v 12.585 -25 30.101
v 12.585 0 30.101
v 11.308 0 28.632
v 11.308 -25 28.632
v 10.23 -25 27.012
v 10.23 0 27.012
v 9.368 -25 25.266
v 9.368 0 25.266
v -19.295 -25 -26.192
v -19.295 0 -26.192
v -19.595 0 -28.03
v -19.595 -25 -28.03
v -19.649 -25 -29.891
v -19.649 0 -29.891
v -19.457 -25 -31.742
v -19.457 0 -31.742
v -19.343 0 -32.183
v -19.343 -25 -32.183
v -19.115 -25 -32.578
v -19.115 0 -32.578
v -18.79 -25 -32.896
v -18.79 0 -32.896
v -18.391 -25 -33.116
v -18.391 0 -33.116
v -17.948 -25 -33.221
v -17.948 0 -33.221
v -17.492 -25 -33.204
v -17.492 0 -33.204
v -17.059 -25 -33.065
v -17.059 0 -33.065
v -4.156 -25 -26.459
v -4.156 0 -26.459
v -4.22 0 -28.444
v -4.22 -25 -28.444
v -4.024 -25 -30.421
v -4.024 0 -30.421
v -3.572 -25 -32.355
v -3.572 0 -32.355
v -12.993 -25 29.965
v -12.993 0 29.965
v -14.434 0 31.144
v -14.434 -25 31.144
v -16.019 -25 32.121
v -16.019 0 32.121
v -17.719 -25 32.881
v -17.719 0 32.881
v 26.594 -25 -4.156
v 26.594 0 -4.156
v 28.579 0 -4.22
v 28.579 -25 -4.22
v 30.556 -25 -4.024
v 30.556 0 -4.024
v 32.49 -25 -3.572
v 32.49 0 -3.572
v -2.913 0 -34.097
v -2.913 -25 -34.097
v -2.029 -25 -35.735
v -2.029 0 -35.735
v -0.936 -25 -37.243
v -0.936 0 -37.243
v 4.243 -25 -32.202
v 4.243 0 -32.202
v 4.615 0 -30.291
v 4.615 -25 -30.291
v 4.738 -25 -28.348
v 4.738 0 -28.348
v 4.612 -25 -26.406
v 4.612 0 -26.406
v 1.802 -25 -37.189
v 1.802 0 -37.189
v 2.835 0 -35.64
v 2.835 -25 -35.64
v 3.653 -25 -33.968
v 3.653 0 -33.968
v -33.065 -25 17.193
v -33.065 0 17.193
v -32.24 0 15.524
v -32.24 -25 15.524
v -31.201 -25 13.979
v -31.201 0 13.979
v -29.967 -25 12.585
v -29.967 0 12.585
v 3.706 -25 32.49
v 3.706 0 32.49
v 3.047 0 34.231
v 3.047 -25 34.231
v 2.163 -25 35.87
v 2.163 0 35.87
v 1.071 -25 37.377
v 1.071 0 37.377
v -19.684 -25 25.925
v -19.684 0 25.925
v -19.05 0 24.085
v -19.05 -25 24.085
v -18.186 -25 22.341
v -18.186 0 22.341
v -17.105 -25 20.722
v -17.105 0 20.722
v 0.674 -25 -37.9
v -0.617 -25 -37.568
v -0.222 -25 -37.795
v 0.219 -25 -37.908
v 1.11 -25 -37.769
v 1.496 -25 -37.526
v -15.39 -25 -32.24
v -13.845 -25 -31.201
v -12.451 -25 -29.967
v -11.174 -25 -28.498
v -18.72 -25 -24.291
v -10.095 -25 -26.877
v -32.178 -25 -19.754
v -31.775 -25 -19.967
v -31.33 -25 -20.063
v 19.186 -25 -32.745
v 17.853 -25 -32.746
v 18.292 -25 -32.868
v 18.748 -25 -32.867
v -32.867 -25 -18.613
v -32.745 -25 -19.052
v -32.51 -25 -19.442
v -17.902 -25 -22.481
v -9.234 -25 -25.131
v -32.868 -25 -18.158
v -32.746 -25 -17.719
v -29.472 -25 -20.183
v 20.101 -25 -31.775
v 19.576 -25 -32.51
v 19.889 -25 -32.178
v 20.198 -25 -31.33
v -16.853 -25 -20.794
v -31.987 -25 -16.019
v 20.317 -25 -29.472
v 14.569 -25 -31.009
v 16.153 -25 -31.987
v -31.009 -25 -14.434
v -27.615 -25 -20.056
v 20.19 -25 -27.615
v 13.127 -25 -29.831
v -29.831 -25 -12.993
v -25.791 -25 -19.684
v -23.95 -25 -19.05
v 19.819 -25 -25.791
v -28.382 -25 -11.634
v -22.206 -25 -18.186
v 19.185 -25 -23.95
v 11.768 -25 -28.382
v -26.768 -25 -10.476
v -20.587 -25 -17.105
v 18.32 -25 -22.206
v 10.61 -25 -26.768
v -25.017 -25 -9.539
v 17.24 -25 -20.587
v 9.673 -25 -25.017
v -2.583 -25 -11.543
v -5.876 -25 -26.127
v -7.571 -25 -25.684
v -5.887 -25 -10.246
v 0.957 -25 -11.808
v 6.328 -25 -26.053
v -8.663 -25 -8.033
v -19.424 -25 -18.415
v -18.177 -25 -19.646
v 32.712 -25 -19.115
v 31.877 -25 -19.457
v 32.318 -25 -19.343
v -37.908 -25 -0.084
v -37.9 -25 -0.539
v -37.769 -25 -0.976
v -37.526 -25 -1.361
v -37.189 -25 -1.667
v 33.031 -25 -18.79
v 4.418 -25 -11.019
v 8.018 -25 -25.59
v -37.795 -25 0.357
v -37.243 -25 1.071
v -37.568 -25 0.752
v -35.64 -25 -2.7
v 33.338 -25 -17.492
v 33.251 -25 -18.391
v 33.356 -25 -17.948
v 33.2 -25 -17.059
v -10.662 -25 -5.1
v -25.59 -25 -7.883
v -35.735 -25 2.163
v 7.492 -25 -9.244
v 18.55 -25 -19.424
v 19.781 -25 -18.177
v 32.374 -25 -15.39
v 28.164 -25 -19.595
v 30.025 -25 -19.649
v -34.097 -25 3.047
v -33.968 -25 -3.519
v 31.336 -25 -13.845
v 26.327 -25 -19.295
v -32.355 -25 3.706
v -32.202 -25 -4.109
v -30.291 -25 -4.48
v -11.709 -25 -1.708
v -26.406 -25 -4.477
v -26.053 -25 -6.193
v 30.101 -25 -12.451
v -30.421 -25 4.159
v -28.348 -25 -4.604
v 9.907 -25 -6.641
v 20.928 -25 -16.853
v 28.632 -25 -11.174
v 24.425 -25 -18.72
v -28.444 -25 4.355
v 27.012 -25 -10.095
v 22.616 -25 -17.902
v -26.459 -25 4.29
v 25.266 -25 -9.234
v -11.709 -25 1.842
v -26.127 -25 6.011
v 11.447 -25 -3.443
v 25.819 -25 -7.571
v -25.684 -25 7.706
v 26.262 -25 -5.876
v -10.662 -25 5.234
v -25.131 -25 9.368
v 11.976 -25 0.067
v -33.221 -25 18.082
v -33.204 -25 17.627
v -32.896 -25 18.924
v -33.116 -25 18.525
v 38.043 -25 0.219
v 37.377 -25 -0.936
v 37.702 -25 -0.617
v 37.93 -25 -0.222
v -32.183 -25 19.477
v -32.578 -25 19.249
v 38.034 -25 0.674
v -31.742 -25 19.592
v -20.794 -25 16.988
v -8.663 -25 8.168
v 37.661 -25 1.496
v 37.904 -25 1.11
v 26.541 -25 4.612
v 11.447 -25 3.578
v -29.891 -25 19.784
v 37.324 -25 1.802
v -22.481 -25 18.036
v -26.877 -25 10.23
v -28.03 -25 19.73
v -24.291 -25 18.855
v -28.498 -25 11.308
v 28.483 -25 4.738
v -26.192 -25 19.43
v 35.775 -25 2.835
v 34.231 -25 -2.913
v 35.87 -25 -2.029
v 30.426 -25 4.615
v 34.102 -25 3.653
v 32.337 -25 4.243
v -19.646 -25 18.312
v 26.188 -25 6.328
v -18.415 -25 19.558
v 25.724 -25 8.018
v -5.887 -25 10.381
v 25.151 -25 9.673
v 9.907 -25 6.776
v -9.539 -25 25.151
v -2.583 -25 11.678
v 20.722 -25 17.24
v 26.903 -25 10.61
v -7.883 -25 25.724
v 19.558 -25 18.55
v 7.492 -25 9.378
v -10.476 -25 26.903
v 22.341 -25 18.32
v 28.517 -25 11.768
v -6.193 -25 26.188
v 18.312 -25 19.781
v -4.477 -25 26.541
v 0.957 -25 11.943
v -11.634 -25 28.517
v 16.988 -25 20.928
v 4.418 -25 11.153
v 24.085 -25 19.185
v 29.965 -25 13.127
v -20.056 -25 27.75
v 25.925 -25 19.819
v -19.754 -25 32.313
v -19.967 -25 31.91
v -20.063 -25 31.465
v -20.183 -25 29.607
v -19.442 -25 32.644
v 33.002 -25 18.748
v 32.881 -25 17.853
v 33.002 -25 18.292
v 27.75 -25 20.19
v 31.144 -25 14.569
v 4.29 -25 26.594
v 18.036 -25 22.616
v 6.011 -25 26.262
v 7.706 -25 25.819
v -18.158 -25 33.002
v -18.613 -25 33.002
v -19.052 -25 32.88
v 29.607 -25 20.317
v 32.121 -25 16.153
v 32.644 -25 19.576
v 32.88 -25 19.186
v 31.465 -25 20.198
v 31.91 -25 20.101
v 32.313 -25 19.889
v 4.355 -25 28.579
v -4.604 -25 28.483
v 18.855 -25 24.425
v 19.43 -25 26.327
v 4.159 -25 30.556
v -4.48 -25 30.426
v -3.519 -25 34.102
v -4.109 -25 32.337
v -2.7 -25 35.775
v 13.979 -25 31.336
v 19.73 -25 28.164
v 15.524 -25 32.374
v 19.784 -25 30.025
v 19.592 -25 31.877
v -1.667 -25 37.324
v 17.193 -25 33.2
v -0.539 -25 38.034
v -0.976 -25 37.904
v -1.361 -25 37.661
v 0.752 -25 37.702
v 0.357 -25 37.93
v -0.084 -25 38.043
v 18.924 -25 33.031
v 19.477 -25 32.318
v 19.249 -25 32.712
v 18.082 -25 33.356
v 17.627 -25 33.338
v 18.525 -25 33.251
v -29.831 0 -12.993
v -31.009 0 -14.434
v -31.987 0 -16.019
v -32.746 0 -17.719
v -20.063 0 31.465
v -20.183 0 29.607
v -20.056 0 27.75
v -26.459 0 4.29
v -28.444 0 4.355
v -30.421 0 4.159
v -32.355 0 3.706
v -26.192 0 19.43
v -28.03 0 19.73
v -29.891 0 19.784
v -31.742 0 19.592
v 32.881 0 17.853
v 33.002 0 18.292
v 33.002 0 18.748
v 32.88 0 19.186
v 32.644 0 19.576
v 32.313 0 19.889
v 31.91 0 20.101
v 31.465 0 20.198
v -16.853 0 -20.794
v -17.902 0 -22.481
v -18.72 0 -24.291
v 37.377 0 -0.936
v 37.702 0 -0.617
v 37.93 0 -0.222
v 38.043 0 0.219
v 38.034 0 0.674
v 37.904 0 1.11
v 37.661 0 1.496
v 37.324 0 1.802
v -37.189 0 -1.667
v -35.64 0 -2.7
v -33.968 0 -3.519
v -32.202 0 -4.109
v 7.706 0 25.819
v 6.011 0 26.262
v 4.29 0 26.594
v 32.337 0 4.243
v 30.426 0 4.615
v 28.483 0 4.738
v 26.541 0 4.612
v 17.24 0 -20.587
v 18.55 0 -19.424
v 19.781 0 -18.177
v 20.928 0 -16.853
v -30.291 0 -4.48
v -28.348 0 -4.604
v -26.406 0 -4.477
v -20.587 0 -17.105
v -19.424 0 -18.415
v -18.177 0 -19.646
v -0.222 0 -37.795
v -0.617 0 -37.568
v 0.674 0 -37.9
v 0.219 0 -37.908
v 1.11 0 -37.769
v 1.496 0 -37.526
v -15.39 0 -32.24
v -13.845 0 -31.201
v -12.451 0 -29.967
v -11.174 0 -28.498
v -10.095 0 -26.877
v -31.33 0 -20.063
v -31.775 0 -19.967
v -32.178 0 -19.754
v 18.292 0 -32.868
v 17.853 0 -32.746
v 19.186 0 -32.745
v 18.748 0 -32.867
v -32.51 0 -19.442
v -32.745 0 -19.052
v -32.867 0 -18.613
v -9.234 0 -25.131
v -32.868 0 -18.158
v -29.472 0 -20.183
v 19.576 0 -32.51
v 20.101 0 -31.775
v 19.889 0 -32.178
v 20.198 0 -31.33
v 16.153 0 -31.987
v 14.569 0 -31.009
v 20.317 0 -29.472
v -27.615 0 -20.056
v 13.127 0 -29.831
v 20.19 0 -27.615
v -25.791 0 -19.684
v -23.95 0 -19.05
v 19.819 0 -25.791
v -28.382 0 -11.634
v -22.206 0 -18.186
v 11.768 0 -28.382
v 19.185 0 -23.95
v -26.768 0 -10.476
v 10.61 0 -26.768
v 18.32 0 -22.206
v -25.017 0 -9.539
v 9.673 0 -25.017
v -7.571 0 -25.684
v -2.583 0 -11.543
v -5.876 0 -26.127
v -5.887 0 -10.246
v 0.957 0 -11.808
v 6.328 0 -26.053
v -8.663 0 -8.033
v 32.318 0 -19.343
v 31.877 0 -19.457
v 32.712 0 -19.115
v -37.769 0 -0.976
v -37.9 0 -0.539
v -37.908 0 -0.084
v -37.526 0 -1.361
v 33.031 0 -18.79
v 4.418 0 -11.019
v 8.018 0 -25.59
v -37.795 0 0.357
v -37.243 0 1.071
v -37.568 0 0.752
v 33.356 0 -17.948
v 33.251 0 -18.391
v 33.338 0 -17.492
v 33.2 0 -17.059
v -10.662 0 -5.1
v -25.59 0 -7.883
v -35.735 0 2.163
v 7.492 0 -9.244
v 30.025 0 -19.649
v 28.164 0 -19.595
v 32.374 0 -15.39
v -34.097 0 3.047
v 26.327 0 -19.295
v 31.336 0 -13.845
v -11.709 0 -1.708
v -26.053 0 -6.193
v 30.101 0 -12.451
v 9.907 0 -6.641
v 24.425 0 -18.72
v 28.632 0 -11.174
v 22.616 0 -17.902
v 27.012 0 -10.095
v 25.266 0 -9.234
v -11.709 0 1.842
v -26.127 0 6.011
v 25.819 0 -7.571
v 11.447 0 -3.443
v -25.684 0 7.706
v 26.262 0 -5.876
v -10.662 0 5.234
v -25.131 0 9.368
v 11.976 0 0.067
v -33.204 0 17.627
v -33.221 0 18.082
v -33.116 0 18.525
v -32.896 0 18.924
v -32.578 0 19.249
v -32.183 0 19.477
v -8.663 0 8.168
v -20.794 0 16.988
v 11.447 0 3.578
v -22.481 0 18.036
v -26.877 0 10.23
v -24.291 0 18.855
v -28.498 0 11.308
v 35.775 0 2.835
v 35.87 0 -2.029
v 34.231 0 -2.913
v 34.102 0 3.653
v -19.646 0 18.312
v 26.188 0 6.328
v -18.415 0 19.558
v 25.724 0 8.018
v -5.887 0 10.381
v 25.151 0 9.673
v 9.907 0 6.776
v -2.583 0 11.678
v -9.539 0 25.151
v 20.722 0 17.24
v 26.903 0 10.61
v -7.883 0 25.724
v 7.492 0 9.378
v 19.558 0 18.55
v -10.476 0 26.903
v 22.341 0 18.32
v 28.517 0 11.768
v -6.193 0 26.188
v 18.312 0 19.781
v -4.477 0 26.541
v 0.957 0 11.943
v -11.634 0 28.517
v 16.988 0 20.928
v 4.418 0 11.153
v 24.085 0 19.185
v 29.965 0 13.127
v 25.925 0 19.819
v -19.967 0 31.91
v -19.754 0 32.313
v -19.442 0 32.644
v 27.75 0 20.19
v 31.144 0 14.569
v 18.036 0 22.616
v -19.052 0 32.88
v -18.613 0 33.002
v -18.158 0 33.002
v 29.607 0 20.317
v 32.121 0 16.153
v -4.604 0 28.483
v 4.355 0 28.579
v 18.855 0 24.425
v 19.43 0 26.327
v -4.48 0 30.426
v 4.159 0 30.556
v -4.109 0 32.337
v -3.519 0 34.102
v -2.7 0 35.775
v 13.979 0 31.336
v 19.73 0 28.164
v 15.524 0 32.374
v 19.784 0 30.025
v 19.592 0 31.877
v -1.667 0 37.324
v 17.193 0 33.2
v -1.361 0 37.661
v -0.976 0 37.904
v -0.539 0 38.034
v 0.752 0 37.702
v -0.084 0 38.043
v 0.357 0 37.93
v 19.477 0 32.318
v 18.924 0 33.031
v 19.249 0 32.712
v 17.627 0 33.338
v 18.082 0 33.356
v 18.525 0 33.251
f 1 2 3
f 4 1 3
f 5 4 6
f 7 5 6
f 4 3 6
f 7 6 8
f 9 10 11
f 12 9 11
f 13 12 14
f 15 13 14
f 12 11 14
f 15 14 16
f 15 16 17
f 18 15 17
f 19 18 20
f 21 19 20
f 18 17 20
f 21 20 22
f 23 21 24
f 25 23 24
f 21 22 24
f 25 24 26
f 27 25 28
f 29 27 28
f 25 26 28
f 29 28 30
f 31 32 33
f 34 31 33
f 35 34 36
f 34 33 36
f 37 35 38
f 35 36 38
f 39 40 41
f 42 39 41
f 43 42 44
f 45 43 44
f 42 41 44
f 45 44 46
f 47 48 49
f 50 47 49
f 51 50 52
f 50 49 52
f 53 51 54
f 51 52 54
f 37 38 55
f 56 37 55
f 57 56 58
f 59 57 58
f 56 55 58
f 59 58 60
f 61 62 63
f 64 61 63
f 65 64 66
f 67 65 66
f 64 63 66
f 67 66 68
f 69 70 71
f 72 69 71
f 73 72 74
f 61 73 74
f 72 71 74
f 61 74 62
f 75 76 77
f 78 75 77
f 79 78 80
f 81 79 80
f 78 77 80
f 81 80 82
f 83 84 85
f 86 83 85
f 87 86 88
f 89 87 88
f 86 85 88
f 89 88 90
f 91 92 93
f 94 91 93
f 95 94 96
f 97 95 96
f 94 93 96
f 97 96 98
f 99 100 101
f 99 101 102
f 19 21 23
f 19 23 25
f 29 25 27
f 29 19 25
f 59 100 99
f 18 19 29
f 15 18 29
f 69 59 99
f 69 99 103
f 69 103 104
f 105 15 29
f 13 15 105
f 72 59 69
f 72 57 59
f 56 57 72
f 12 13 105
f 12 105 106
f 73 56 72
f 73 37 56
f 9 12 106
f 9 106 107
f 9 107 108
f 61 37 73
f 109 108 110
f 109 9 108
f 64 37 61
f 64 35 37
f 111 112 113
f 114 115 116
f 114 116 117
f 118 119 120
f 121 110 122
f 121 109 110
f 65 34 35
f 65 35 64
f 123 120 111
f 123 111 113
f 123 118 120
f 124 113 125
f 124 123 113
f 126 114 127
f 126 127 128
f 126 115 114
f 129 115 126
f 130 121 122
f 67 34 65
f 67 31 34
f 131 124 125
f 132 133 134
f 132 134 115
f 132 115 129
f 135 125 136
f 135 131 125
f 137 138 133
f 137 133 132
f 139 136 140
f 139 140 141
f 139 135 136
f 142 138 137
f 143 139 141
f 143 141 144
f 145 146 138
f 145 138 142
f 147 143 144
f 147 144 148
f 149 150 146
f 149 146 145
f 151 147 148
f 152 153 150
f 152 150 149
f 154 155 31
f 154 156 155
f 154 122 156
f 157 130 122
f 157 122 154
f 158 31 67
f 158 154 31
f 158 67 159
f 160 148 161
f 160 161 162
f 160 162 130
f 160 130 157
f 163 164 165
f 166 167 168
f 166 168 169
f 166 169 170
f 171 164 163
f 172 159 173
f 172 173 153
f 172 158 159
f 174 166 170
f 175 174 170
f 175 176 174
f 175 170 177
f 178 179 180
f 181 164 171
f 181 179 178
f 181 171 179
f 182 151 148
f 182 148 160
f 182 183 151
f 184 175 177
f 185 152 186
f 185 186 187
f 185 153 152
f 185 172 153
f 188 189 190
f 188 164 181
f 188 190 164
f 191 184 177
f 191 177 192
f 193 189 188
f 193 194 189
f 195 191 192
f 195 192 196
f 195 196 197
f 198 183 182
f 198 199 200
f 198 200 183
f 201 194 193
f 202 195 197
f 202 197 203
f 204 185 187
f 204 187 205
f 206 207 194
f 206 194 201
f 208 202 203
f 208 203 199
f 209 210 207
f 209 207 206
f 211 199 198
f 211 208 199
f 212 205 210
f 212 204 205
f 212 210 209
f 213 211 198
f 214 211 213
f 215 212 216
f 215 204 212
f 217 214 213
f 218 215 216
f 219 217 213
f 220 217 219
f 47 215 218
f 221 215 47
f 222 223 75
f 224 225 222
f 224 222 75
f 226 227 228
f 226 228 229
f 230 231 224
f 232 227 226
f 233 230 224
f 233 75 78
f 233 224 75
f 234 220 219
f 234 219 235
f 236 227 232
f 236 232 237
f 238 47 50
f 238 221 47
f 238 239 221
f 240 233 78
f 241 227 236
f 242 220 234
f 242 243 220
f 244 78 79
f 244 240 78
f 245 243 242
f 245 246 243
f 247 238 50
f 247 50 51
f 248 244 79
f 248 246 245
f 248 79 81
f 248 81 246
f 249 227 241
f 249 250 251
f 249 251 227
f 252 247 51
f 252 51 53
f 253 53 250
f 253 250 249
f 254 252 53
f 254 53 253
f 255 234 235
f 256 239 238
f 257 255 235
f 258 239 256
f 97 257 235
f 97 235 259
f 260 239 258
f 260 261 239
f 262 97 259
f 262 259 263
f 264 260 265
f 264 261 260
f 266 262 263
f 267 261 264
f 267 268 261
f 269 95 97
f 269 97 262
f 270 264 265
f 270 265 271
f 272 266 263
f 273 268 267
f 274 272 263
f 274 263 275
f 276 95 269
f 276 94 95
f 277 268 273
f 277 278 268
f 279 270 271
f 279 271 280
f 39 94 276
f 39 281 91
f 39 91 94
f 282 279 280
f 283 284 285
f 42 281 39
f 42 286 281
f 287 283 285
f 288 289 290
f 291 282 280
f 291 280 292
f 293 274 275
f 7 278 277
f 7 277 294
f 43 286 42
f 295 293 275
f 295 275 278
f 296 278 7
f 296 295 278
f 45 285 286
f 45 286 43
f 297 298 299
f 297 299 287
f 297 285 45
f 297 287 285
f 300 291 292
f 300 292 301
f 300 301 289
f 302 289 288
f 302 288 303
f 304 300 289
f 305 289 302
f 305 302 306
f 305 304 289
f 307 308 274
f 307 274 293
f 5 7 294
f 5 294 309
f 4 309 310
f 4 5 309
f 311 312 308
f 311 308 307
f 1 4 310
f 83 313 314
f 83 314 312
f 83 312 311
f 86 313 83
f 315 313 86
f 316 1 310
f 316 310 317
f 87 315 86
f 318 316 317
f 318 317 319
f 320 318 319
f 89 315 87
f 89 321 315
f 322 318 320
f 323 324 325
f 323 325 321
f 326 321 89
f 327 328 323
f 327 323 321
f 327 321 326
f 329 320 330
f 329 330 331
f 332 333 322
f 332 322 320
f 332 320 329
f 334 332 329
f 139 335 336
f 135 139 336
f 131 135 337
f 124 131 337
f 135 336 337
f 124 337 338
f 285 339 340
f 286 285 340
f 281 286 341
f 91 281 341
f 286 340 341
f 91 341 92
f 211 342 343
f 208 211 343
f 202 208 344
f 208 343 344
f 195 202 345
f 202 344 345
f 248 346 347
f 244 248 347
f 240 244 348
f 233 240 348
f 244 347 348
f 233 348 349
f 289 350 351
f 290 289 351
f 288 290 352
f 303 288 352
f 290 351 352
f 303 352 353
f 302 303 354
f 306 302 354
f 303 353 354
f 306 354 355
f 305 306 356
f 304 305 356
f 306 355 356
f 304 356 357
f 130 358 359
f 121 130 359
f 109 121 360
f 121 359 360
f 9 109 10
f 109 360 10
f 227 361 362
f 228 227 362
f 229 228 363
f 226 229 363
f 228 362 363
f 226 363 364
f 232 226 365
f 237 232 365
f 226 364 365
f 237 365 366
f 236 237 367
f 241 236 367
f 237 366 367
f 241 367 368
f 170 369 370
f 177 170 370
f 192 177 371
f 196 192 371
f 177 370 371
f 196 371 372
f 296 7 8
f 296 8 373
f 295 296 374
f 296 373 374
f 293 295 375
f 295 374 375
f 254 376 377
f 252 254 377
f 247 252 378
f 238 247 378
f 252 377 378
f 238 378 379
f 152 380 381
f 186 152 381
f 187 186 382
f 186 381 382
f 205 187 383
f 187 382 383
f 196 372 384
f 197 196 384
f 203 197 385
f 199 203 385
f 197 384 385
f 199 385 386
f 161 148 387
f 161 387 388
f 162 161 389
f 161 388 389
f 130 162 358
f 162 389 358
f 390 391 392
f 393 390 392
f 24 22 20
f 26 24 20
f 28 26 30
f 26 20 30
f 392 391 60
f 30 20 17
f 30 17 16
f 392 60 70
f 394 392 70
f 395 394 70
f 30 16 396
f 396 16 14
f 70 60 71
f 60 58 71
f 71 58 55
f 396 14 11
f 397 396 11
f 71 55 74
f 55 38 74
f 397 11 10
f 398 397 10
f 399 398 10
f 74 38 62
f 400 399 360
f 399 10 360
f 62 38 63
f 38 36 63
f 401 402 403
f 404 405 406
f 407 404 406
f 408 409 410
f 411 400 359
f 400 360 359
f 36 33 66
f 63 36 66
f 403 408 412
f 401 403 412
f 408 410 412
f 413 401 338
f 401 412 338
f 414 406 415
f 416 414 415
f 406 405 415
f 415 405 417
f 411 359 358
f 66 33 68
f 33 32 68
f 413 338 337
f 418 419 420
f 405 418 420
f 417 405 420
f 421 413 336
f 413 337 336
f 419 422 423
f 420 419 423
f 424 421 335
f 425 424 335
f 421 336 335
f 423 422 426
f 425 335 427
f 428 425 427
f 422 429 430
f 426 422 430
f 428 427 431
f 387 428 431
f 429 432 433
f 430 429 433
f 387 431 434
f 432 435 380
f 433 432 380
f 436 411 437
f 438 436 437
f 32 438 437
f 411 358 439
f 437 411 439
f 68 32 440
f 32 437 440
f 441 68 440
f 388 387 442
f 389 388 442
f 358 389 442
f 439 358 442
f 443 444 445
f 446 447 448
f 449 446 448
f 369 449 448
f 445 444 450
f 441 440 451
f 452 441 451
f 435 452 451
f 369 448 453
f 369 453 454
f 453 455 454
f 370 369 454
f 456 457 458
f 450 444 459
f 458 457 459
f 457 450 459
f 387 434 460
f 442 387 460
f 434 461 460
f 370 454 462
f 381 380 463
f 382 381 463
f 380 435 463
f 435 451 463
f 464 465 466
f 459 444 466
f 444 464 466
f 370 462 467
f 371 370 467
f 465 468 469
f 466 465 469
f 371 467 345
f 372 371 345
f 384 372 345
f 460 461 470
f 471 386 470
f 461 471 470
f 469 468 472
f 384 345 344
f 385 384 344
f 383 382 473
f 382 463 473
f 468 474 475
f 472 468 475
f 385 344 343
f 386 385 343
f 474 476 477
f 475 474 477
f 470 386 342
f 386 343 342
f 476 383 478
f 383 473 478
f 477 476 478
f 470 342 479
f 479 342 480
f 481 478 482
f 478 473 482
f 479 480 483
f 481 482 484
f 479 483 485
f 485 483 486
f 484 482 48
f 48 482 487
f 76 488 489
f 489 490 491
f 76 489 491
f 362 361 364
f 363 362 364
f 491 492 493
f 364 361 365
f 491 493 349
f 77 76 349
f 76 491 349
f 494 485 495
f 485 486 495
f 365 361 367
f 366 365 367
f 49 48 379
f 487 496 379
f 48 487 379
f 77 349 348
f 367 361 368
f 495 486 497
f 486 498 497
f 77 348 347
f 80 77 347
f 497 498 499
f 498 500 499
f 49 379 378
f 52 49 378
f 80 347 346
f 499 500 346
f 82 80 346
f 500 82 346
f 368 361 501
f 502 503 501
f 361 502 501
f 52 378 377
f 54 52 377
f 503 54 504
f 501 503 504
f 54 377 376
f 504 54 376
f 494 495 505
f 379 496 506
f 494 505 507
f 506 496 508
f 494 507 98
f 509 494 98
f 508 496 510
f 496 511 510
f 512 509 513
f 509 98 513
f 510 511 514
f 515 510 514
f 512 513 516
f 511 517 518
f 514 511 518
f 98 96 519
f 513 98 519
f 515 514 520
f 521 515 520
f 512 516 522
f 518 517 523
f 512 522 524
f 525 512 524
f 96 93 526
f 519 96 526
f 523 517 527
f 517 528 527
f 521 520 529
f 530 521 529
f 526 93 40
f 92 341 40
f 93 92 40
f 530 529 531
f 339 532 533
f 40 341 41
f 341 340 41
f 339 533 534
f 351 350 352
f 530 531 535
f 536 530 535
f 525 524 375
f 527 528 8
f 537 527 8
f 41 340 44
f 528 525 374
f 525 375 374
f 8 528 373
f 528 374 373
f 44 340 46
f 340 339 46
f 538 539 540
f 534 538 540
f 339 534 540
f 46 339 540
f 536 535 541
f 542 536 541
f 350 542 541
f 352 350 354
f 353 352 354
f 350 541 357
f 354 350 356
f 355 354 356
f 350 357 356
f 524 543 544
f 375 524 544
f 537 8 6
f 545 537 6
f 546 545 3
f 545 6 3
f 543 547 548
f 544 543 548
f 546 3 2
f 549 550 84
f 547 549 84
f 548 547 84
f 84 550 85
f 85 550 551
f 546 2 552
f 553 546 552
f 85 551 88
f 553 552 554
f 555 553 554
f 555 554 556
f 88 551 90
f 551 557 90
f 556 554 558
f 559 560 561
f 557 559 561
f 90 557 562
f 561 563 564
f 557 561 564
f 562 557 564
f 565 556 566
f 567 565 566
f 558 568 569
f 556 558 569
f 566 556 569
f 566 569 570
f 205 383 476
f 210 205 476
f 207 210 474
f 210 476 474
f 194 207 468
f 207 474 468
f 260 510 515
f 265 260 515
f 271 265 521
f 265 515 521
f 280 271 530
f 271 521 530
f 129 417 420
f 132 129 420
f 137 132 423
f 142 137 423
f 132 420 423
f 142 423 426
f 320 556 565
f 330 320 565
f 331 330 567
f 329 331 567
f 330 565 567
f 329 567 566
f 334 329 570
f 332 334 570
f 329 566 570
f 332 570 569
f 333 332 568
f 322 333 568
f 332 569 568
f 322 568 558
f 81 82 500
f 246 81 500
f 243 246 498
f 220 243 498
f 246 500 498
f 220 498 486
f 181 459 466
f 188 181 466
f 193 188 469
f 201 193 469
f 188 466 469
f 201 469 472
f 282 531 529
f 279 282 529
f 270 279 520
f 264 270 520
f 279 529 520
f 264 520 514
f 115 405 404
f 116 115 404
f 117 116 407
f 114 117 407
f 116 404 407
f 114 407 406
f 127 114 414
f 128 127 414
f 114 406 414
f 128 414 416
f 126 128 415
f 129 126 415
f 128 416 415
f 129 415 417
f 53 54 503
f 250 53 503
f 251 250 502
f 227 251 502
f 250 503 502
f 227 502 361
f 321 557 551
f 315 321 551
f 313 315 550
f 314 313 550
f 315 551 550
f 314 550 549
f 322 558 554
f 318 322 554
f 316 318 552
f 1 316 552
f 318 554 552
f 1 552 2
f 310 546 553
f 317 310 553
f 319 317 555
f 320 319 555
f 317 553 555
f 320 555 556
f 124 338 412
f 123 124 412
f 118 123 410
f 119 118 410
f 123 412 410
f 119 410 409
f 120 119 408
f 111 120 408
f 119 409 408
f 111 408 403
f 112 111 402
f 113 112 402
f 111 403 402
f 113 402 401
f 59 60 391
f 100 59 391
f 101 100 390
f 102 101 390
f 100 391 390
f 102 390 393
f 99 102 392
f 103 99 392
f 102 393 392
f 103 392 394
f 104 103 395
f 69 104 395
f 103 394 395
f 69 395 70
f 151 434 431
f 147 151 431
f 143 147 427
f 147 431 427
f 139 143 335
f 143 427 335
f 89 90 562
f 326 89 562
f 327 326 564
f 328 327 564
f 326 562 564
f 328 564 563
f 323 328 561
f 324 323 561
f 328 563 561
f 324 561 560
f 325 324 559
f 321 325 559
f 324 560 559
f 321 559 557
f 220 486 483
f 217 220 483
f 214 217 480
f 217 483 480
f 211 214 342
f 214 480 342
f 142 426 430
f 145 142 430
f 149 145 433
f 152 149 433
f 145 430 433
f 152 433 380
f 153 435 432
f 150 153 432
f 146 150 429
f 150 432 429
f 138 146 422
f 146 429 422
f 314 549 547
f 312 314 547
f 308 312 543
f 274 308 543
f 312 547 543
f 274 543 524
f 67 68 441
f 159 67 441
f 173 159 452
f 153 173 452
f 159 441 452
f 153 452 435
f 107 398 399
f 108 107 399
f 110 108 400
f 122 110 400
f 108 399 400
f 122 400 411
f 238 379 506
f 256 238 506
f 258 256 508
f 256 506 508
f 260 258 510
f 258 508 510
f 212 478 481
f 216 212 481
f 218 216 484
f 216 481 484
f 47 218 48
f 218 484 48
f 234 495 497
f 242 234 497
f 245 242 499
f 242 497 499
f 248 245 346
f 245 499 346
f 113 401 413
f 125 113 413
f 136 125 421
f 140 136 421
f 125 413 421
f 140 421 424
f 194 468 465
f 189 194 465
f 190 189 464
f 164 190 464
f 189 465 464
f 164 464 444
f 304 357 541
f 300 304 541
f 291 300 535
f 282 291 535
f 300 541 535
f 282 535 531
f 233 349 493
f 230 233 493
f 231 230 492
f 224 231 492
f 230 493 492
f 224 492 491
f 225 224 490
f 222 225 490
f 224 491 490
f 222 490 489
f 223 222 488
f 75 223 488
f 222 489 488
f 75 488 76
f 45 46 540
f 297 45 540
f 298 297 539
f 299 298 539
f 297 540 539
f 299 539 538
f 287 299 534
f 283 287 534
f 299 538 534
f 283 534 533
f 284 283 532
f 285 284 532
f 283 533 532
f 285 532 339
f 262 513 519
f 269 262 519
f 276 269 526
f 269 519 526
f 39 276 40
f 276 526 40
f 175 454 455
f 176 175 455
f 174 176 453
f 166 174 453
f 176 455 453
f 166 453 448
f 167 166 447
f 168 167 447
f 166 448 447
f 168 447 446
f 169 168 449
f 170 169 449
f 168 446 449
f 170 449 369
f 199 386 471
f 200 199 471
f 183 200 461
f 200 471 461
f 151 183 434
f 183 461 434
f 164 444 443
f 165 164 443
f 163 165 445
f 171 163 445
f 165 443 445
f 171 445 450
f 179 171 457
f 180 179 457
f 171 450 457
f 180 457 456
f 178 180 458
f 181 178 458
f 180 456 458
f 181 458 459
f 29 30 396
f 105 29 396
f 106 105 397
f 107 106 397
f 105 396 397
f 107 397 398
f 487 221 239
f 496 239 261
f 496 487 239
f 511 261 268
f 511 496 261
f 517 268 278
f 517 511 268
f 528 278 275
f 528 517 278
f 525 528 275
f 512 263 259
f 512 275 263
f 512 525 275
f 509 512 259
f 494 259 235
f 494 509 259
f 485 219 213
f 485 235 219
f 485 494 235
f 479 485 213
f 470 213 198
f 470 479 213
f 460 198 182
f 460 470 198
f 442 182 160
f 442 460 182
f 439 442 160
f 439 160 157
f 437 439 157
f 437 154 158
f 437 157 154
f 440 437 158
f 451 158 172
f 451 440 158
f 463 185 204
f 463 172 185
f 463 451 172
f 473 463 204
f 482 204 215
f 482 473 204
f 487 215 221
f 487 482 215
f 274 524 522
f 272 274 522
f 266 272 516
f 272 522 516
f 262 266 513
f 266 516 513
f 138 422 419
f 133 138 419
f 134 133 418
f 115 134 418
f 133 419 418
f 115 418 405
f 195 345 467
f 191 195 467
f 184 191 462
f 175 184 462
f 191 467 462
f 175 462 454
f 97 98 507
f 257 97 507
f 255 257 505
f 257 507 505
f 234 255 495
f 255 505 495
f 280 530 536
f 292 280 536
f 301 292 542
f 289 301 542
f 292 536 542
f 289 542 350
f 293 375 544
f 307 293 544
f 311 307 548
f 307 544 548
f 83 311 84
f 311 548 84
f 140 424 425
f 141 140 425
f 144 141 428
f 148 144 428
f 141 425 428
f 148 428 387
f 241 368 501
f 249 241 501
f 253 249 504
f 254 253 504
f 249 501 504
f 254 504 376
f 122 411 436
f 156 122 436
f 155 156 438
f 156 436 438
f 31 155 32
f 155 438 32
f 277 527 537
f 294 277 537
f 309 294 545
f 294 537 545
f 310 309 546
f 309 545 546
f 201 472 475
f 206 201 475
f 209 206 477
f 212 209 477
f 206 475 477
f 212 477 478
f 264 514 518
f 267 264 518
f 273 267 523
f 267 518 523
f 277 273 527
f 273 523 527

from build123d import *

# Parameters (mm, degrees)
F0_R     = 11.90906
F1_DEPTH = 25
F2_COUNT = 12


with BuildPart() as f1:
    # F0 (on Front) → F1 (new body)
    with BuildSketch(Plane.XZ):
        with BuildLine():
            ThreePointArc((-4.4772, 26.540564), (-0.095682, 26.927299), (4.290206, 26.593761))
            ThreePointArc((4.290206, 26.593761), (4.28911, 29.570632), (3.706133, 32.489861))
            ThreePointArc((3.706133, 32.489861), (2.632484, 35.065209), (1.07088, 37.377466))
            ThreePointArc((1.07088, 37.377466), (-0.312037, 38.054077), (-1.667357, 37.323755))
            ThreePointArc((-1.667357, 37.323755), (-3.137083, 34.952037), (-4.108913, 32.336566))
            ThreePointArc((-4.108913, 32.336566), (-4.573289, 29.456371), (-4.4772, 26.540564))
        make_face()
        with BuildLine():
            ThreePointArc((-4.4772, 26.540564), (-17.244829, -20.469915), (26.927793, 0.067293))
            ThreePointArc((26.927793, 0.067293), (20.499082, 17.503705), (4.290206, 26.593761))
            ThreePointArc((4.290206, 26.593761), (-0.095682, 26.927299), (-4.4772, 26.540564))
        make_face()
        with Locations((0.067293, 0.067293)):
            Circle(F0_R, mode=Mode.SUBTRACT)
    extrude(amount=F1_DEPTH)

    # F2: F1 ×12 about axis
    f2_axis = Axis((0.067293, 0, 0.067293), (0, 1, 0))


with BuildPart() as f1_1:
    add(f1.part)
    for i in range(1, F2_COUNT):
        add(f1.part.rotate(f2_axis, i * 360 / F2_COUNT))


solid = f1_1.part
